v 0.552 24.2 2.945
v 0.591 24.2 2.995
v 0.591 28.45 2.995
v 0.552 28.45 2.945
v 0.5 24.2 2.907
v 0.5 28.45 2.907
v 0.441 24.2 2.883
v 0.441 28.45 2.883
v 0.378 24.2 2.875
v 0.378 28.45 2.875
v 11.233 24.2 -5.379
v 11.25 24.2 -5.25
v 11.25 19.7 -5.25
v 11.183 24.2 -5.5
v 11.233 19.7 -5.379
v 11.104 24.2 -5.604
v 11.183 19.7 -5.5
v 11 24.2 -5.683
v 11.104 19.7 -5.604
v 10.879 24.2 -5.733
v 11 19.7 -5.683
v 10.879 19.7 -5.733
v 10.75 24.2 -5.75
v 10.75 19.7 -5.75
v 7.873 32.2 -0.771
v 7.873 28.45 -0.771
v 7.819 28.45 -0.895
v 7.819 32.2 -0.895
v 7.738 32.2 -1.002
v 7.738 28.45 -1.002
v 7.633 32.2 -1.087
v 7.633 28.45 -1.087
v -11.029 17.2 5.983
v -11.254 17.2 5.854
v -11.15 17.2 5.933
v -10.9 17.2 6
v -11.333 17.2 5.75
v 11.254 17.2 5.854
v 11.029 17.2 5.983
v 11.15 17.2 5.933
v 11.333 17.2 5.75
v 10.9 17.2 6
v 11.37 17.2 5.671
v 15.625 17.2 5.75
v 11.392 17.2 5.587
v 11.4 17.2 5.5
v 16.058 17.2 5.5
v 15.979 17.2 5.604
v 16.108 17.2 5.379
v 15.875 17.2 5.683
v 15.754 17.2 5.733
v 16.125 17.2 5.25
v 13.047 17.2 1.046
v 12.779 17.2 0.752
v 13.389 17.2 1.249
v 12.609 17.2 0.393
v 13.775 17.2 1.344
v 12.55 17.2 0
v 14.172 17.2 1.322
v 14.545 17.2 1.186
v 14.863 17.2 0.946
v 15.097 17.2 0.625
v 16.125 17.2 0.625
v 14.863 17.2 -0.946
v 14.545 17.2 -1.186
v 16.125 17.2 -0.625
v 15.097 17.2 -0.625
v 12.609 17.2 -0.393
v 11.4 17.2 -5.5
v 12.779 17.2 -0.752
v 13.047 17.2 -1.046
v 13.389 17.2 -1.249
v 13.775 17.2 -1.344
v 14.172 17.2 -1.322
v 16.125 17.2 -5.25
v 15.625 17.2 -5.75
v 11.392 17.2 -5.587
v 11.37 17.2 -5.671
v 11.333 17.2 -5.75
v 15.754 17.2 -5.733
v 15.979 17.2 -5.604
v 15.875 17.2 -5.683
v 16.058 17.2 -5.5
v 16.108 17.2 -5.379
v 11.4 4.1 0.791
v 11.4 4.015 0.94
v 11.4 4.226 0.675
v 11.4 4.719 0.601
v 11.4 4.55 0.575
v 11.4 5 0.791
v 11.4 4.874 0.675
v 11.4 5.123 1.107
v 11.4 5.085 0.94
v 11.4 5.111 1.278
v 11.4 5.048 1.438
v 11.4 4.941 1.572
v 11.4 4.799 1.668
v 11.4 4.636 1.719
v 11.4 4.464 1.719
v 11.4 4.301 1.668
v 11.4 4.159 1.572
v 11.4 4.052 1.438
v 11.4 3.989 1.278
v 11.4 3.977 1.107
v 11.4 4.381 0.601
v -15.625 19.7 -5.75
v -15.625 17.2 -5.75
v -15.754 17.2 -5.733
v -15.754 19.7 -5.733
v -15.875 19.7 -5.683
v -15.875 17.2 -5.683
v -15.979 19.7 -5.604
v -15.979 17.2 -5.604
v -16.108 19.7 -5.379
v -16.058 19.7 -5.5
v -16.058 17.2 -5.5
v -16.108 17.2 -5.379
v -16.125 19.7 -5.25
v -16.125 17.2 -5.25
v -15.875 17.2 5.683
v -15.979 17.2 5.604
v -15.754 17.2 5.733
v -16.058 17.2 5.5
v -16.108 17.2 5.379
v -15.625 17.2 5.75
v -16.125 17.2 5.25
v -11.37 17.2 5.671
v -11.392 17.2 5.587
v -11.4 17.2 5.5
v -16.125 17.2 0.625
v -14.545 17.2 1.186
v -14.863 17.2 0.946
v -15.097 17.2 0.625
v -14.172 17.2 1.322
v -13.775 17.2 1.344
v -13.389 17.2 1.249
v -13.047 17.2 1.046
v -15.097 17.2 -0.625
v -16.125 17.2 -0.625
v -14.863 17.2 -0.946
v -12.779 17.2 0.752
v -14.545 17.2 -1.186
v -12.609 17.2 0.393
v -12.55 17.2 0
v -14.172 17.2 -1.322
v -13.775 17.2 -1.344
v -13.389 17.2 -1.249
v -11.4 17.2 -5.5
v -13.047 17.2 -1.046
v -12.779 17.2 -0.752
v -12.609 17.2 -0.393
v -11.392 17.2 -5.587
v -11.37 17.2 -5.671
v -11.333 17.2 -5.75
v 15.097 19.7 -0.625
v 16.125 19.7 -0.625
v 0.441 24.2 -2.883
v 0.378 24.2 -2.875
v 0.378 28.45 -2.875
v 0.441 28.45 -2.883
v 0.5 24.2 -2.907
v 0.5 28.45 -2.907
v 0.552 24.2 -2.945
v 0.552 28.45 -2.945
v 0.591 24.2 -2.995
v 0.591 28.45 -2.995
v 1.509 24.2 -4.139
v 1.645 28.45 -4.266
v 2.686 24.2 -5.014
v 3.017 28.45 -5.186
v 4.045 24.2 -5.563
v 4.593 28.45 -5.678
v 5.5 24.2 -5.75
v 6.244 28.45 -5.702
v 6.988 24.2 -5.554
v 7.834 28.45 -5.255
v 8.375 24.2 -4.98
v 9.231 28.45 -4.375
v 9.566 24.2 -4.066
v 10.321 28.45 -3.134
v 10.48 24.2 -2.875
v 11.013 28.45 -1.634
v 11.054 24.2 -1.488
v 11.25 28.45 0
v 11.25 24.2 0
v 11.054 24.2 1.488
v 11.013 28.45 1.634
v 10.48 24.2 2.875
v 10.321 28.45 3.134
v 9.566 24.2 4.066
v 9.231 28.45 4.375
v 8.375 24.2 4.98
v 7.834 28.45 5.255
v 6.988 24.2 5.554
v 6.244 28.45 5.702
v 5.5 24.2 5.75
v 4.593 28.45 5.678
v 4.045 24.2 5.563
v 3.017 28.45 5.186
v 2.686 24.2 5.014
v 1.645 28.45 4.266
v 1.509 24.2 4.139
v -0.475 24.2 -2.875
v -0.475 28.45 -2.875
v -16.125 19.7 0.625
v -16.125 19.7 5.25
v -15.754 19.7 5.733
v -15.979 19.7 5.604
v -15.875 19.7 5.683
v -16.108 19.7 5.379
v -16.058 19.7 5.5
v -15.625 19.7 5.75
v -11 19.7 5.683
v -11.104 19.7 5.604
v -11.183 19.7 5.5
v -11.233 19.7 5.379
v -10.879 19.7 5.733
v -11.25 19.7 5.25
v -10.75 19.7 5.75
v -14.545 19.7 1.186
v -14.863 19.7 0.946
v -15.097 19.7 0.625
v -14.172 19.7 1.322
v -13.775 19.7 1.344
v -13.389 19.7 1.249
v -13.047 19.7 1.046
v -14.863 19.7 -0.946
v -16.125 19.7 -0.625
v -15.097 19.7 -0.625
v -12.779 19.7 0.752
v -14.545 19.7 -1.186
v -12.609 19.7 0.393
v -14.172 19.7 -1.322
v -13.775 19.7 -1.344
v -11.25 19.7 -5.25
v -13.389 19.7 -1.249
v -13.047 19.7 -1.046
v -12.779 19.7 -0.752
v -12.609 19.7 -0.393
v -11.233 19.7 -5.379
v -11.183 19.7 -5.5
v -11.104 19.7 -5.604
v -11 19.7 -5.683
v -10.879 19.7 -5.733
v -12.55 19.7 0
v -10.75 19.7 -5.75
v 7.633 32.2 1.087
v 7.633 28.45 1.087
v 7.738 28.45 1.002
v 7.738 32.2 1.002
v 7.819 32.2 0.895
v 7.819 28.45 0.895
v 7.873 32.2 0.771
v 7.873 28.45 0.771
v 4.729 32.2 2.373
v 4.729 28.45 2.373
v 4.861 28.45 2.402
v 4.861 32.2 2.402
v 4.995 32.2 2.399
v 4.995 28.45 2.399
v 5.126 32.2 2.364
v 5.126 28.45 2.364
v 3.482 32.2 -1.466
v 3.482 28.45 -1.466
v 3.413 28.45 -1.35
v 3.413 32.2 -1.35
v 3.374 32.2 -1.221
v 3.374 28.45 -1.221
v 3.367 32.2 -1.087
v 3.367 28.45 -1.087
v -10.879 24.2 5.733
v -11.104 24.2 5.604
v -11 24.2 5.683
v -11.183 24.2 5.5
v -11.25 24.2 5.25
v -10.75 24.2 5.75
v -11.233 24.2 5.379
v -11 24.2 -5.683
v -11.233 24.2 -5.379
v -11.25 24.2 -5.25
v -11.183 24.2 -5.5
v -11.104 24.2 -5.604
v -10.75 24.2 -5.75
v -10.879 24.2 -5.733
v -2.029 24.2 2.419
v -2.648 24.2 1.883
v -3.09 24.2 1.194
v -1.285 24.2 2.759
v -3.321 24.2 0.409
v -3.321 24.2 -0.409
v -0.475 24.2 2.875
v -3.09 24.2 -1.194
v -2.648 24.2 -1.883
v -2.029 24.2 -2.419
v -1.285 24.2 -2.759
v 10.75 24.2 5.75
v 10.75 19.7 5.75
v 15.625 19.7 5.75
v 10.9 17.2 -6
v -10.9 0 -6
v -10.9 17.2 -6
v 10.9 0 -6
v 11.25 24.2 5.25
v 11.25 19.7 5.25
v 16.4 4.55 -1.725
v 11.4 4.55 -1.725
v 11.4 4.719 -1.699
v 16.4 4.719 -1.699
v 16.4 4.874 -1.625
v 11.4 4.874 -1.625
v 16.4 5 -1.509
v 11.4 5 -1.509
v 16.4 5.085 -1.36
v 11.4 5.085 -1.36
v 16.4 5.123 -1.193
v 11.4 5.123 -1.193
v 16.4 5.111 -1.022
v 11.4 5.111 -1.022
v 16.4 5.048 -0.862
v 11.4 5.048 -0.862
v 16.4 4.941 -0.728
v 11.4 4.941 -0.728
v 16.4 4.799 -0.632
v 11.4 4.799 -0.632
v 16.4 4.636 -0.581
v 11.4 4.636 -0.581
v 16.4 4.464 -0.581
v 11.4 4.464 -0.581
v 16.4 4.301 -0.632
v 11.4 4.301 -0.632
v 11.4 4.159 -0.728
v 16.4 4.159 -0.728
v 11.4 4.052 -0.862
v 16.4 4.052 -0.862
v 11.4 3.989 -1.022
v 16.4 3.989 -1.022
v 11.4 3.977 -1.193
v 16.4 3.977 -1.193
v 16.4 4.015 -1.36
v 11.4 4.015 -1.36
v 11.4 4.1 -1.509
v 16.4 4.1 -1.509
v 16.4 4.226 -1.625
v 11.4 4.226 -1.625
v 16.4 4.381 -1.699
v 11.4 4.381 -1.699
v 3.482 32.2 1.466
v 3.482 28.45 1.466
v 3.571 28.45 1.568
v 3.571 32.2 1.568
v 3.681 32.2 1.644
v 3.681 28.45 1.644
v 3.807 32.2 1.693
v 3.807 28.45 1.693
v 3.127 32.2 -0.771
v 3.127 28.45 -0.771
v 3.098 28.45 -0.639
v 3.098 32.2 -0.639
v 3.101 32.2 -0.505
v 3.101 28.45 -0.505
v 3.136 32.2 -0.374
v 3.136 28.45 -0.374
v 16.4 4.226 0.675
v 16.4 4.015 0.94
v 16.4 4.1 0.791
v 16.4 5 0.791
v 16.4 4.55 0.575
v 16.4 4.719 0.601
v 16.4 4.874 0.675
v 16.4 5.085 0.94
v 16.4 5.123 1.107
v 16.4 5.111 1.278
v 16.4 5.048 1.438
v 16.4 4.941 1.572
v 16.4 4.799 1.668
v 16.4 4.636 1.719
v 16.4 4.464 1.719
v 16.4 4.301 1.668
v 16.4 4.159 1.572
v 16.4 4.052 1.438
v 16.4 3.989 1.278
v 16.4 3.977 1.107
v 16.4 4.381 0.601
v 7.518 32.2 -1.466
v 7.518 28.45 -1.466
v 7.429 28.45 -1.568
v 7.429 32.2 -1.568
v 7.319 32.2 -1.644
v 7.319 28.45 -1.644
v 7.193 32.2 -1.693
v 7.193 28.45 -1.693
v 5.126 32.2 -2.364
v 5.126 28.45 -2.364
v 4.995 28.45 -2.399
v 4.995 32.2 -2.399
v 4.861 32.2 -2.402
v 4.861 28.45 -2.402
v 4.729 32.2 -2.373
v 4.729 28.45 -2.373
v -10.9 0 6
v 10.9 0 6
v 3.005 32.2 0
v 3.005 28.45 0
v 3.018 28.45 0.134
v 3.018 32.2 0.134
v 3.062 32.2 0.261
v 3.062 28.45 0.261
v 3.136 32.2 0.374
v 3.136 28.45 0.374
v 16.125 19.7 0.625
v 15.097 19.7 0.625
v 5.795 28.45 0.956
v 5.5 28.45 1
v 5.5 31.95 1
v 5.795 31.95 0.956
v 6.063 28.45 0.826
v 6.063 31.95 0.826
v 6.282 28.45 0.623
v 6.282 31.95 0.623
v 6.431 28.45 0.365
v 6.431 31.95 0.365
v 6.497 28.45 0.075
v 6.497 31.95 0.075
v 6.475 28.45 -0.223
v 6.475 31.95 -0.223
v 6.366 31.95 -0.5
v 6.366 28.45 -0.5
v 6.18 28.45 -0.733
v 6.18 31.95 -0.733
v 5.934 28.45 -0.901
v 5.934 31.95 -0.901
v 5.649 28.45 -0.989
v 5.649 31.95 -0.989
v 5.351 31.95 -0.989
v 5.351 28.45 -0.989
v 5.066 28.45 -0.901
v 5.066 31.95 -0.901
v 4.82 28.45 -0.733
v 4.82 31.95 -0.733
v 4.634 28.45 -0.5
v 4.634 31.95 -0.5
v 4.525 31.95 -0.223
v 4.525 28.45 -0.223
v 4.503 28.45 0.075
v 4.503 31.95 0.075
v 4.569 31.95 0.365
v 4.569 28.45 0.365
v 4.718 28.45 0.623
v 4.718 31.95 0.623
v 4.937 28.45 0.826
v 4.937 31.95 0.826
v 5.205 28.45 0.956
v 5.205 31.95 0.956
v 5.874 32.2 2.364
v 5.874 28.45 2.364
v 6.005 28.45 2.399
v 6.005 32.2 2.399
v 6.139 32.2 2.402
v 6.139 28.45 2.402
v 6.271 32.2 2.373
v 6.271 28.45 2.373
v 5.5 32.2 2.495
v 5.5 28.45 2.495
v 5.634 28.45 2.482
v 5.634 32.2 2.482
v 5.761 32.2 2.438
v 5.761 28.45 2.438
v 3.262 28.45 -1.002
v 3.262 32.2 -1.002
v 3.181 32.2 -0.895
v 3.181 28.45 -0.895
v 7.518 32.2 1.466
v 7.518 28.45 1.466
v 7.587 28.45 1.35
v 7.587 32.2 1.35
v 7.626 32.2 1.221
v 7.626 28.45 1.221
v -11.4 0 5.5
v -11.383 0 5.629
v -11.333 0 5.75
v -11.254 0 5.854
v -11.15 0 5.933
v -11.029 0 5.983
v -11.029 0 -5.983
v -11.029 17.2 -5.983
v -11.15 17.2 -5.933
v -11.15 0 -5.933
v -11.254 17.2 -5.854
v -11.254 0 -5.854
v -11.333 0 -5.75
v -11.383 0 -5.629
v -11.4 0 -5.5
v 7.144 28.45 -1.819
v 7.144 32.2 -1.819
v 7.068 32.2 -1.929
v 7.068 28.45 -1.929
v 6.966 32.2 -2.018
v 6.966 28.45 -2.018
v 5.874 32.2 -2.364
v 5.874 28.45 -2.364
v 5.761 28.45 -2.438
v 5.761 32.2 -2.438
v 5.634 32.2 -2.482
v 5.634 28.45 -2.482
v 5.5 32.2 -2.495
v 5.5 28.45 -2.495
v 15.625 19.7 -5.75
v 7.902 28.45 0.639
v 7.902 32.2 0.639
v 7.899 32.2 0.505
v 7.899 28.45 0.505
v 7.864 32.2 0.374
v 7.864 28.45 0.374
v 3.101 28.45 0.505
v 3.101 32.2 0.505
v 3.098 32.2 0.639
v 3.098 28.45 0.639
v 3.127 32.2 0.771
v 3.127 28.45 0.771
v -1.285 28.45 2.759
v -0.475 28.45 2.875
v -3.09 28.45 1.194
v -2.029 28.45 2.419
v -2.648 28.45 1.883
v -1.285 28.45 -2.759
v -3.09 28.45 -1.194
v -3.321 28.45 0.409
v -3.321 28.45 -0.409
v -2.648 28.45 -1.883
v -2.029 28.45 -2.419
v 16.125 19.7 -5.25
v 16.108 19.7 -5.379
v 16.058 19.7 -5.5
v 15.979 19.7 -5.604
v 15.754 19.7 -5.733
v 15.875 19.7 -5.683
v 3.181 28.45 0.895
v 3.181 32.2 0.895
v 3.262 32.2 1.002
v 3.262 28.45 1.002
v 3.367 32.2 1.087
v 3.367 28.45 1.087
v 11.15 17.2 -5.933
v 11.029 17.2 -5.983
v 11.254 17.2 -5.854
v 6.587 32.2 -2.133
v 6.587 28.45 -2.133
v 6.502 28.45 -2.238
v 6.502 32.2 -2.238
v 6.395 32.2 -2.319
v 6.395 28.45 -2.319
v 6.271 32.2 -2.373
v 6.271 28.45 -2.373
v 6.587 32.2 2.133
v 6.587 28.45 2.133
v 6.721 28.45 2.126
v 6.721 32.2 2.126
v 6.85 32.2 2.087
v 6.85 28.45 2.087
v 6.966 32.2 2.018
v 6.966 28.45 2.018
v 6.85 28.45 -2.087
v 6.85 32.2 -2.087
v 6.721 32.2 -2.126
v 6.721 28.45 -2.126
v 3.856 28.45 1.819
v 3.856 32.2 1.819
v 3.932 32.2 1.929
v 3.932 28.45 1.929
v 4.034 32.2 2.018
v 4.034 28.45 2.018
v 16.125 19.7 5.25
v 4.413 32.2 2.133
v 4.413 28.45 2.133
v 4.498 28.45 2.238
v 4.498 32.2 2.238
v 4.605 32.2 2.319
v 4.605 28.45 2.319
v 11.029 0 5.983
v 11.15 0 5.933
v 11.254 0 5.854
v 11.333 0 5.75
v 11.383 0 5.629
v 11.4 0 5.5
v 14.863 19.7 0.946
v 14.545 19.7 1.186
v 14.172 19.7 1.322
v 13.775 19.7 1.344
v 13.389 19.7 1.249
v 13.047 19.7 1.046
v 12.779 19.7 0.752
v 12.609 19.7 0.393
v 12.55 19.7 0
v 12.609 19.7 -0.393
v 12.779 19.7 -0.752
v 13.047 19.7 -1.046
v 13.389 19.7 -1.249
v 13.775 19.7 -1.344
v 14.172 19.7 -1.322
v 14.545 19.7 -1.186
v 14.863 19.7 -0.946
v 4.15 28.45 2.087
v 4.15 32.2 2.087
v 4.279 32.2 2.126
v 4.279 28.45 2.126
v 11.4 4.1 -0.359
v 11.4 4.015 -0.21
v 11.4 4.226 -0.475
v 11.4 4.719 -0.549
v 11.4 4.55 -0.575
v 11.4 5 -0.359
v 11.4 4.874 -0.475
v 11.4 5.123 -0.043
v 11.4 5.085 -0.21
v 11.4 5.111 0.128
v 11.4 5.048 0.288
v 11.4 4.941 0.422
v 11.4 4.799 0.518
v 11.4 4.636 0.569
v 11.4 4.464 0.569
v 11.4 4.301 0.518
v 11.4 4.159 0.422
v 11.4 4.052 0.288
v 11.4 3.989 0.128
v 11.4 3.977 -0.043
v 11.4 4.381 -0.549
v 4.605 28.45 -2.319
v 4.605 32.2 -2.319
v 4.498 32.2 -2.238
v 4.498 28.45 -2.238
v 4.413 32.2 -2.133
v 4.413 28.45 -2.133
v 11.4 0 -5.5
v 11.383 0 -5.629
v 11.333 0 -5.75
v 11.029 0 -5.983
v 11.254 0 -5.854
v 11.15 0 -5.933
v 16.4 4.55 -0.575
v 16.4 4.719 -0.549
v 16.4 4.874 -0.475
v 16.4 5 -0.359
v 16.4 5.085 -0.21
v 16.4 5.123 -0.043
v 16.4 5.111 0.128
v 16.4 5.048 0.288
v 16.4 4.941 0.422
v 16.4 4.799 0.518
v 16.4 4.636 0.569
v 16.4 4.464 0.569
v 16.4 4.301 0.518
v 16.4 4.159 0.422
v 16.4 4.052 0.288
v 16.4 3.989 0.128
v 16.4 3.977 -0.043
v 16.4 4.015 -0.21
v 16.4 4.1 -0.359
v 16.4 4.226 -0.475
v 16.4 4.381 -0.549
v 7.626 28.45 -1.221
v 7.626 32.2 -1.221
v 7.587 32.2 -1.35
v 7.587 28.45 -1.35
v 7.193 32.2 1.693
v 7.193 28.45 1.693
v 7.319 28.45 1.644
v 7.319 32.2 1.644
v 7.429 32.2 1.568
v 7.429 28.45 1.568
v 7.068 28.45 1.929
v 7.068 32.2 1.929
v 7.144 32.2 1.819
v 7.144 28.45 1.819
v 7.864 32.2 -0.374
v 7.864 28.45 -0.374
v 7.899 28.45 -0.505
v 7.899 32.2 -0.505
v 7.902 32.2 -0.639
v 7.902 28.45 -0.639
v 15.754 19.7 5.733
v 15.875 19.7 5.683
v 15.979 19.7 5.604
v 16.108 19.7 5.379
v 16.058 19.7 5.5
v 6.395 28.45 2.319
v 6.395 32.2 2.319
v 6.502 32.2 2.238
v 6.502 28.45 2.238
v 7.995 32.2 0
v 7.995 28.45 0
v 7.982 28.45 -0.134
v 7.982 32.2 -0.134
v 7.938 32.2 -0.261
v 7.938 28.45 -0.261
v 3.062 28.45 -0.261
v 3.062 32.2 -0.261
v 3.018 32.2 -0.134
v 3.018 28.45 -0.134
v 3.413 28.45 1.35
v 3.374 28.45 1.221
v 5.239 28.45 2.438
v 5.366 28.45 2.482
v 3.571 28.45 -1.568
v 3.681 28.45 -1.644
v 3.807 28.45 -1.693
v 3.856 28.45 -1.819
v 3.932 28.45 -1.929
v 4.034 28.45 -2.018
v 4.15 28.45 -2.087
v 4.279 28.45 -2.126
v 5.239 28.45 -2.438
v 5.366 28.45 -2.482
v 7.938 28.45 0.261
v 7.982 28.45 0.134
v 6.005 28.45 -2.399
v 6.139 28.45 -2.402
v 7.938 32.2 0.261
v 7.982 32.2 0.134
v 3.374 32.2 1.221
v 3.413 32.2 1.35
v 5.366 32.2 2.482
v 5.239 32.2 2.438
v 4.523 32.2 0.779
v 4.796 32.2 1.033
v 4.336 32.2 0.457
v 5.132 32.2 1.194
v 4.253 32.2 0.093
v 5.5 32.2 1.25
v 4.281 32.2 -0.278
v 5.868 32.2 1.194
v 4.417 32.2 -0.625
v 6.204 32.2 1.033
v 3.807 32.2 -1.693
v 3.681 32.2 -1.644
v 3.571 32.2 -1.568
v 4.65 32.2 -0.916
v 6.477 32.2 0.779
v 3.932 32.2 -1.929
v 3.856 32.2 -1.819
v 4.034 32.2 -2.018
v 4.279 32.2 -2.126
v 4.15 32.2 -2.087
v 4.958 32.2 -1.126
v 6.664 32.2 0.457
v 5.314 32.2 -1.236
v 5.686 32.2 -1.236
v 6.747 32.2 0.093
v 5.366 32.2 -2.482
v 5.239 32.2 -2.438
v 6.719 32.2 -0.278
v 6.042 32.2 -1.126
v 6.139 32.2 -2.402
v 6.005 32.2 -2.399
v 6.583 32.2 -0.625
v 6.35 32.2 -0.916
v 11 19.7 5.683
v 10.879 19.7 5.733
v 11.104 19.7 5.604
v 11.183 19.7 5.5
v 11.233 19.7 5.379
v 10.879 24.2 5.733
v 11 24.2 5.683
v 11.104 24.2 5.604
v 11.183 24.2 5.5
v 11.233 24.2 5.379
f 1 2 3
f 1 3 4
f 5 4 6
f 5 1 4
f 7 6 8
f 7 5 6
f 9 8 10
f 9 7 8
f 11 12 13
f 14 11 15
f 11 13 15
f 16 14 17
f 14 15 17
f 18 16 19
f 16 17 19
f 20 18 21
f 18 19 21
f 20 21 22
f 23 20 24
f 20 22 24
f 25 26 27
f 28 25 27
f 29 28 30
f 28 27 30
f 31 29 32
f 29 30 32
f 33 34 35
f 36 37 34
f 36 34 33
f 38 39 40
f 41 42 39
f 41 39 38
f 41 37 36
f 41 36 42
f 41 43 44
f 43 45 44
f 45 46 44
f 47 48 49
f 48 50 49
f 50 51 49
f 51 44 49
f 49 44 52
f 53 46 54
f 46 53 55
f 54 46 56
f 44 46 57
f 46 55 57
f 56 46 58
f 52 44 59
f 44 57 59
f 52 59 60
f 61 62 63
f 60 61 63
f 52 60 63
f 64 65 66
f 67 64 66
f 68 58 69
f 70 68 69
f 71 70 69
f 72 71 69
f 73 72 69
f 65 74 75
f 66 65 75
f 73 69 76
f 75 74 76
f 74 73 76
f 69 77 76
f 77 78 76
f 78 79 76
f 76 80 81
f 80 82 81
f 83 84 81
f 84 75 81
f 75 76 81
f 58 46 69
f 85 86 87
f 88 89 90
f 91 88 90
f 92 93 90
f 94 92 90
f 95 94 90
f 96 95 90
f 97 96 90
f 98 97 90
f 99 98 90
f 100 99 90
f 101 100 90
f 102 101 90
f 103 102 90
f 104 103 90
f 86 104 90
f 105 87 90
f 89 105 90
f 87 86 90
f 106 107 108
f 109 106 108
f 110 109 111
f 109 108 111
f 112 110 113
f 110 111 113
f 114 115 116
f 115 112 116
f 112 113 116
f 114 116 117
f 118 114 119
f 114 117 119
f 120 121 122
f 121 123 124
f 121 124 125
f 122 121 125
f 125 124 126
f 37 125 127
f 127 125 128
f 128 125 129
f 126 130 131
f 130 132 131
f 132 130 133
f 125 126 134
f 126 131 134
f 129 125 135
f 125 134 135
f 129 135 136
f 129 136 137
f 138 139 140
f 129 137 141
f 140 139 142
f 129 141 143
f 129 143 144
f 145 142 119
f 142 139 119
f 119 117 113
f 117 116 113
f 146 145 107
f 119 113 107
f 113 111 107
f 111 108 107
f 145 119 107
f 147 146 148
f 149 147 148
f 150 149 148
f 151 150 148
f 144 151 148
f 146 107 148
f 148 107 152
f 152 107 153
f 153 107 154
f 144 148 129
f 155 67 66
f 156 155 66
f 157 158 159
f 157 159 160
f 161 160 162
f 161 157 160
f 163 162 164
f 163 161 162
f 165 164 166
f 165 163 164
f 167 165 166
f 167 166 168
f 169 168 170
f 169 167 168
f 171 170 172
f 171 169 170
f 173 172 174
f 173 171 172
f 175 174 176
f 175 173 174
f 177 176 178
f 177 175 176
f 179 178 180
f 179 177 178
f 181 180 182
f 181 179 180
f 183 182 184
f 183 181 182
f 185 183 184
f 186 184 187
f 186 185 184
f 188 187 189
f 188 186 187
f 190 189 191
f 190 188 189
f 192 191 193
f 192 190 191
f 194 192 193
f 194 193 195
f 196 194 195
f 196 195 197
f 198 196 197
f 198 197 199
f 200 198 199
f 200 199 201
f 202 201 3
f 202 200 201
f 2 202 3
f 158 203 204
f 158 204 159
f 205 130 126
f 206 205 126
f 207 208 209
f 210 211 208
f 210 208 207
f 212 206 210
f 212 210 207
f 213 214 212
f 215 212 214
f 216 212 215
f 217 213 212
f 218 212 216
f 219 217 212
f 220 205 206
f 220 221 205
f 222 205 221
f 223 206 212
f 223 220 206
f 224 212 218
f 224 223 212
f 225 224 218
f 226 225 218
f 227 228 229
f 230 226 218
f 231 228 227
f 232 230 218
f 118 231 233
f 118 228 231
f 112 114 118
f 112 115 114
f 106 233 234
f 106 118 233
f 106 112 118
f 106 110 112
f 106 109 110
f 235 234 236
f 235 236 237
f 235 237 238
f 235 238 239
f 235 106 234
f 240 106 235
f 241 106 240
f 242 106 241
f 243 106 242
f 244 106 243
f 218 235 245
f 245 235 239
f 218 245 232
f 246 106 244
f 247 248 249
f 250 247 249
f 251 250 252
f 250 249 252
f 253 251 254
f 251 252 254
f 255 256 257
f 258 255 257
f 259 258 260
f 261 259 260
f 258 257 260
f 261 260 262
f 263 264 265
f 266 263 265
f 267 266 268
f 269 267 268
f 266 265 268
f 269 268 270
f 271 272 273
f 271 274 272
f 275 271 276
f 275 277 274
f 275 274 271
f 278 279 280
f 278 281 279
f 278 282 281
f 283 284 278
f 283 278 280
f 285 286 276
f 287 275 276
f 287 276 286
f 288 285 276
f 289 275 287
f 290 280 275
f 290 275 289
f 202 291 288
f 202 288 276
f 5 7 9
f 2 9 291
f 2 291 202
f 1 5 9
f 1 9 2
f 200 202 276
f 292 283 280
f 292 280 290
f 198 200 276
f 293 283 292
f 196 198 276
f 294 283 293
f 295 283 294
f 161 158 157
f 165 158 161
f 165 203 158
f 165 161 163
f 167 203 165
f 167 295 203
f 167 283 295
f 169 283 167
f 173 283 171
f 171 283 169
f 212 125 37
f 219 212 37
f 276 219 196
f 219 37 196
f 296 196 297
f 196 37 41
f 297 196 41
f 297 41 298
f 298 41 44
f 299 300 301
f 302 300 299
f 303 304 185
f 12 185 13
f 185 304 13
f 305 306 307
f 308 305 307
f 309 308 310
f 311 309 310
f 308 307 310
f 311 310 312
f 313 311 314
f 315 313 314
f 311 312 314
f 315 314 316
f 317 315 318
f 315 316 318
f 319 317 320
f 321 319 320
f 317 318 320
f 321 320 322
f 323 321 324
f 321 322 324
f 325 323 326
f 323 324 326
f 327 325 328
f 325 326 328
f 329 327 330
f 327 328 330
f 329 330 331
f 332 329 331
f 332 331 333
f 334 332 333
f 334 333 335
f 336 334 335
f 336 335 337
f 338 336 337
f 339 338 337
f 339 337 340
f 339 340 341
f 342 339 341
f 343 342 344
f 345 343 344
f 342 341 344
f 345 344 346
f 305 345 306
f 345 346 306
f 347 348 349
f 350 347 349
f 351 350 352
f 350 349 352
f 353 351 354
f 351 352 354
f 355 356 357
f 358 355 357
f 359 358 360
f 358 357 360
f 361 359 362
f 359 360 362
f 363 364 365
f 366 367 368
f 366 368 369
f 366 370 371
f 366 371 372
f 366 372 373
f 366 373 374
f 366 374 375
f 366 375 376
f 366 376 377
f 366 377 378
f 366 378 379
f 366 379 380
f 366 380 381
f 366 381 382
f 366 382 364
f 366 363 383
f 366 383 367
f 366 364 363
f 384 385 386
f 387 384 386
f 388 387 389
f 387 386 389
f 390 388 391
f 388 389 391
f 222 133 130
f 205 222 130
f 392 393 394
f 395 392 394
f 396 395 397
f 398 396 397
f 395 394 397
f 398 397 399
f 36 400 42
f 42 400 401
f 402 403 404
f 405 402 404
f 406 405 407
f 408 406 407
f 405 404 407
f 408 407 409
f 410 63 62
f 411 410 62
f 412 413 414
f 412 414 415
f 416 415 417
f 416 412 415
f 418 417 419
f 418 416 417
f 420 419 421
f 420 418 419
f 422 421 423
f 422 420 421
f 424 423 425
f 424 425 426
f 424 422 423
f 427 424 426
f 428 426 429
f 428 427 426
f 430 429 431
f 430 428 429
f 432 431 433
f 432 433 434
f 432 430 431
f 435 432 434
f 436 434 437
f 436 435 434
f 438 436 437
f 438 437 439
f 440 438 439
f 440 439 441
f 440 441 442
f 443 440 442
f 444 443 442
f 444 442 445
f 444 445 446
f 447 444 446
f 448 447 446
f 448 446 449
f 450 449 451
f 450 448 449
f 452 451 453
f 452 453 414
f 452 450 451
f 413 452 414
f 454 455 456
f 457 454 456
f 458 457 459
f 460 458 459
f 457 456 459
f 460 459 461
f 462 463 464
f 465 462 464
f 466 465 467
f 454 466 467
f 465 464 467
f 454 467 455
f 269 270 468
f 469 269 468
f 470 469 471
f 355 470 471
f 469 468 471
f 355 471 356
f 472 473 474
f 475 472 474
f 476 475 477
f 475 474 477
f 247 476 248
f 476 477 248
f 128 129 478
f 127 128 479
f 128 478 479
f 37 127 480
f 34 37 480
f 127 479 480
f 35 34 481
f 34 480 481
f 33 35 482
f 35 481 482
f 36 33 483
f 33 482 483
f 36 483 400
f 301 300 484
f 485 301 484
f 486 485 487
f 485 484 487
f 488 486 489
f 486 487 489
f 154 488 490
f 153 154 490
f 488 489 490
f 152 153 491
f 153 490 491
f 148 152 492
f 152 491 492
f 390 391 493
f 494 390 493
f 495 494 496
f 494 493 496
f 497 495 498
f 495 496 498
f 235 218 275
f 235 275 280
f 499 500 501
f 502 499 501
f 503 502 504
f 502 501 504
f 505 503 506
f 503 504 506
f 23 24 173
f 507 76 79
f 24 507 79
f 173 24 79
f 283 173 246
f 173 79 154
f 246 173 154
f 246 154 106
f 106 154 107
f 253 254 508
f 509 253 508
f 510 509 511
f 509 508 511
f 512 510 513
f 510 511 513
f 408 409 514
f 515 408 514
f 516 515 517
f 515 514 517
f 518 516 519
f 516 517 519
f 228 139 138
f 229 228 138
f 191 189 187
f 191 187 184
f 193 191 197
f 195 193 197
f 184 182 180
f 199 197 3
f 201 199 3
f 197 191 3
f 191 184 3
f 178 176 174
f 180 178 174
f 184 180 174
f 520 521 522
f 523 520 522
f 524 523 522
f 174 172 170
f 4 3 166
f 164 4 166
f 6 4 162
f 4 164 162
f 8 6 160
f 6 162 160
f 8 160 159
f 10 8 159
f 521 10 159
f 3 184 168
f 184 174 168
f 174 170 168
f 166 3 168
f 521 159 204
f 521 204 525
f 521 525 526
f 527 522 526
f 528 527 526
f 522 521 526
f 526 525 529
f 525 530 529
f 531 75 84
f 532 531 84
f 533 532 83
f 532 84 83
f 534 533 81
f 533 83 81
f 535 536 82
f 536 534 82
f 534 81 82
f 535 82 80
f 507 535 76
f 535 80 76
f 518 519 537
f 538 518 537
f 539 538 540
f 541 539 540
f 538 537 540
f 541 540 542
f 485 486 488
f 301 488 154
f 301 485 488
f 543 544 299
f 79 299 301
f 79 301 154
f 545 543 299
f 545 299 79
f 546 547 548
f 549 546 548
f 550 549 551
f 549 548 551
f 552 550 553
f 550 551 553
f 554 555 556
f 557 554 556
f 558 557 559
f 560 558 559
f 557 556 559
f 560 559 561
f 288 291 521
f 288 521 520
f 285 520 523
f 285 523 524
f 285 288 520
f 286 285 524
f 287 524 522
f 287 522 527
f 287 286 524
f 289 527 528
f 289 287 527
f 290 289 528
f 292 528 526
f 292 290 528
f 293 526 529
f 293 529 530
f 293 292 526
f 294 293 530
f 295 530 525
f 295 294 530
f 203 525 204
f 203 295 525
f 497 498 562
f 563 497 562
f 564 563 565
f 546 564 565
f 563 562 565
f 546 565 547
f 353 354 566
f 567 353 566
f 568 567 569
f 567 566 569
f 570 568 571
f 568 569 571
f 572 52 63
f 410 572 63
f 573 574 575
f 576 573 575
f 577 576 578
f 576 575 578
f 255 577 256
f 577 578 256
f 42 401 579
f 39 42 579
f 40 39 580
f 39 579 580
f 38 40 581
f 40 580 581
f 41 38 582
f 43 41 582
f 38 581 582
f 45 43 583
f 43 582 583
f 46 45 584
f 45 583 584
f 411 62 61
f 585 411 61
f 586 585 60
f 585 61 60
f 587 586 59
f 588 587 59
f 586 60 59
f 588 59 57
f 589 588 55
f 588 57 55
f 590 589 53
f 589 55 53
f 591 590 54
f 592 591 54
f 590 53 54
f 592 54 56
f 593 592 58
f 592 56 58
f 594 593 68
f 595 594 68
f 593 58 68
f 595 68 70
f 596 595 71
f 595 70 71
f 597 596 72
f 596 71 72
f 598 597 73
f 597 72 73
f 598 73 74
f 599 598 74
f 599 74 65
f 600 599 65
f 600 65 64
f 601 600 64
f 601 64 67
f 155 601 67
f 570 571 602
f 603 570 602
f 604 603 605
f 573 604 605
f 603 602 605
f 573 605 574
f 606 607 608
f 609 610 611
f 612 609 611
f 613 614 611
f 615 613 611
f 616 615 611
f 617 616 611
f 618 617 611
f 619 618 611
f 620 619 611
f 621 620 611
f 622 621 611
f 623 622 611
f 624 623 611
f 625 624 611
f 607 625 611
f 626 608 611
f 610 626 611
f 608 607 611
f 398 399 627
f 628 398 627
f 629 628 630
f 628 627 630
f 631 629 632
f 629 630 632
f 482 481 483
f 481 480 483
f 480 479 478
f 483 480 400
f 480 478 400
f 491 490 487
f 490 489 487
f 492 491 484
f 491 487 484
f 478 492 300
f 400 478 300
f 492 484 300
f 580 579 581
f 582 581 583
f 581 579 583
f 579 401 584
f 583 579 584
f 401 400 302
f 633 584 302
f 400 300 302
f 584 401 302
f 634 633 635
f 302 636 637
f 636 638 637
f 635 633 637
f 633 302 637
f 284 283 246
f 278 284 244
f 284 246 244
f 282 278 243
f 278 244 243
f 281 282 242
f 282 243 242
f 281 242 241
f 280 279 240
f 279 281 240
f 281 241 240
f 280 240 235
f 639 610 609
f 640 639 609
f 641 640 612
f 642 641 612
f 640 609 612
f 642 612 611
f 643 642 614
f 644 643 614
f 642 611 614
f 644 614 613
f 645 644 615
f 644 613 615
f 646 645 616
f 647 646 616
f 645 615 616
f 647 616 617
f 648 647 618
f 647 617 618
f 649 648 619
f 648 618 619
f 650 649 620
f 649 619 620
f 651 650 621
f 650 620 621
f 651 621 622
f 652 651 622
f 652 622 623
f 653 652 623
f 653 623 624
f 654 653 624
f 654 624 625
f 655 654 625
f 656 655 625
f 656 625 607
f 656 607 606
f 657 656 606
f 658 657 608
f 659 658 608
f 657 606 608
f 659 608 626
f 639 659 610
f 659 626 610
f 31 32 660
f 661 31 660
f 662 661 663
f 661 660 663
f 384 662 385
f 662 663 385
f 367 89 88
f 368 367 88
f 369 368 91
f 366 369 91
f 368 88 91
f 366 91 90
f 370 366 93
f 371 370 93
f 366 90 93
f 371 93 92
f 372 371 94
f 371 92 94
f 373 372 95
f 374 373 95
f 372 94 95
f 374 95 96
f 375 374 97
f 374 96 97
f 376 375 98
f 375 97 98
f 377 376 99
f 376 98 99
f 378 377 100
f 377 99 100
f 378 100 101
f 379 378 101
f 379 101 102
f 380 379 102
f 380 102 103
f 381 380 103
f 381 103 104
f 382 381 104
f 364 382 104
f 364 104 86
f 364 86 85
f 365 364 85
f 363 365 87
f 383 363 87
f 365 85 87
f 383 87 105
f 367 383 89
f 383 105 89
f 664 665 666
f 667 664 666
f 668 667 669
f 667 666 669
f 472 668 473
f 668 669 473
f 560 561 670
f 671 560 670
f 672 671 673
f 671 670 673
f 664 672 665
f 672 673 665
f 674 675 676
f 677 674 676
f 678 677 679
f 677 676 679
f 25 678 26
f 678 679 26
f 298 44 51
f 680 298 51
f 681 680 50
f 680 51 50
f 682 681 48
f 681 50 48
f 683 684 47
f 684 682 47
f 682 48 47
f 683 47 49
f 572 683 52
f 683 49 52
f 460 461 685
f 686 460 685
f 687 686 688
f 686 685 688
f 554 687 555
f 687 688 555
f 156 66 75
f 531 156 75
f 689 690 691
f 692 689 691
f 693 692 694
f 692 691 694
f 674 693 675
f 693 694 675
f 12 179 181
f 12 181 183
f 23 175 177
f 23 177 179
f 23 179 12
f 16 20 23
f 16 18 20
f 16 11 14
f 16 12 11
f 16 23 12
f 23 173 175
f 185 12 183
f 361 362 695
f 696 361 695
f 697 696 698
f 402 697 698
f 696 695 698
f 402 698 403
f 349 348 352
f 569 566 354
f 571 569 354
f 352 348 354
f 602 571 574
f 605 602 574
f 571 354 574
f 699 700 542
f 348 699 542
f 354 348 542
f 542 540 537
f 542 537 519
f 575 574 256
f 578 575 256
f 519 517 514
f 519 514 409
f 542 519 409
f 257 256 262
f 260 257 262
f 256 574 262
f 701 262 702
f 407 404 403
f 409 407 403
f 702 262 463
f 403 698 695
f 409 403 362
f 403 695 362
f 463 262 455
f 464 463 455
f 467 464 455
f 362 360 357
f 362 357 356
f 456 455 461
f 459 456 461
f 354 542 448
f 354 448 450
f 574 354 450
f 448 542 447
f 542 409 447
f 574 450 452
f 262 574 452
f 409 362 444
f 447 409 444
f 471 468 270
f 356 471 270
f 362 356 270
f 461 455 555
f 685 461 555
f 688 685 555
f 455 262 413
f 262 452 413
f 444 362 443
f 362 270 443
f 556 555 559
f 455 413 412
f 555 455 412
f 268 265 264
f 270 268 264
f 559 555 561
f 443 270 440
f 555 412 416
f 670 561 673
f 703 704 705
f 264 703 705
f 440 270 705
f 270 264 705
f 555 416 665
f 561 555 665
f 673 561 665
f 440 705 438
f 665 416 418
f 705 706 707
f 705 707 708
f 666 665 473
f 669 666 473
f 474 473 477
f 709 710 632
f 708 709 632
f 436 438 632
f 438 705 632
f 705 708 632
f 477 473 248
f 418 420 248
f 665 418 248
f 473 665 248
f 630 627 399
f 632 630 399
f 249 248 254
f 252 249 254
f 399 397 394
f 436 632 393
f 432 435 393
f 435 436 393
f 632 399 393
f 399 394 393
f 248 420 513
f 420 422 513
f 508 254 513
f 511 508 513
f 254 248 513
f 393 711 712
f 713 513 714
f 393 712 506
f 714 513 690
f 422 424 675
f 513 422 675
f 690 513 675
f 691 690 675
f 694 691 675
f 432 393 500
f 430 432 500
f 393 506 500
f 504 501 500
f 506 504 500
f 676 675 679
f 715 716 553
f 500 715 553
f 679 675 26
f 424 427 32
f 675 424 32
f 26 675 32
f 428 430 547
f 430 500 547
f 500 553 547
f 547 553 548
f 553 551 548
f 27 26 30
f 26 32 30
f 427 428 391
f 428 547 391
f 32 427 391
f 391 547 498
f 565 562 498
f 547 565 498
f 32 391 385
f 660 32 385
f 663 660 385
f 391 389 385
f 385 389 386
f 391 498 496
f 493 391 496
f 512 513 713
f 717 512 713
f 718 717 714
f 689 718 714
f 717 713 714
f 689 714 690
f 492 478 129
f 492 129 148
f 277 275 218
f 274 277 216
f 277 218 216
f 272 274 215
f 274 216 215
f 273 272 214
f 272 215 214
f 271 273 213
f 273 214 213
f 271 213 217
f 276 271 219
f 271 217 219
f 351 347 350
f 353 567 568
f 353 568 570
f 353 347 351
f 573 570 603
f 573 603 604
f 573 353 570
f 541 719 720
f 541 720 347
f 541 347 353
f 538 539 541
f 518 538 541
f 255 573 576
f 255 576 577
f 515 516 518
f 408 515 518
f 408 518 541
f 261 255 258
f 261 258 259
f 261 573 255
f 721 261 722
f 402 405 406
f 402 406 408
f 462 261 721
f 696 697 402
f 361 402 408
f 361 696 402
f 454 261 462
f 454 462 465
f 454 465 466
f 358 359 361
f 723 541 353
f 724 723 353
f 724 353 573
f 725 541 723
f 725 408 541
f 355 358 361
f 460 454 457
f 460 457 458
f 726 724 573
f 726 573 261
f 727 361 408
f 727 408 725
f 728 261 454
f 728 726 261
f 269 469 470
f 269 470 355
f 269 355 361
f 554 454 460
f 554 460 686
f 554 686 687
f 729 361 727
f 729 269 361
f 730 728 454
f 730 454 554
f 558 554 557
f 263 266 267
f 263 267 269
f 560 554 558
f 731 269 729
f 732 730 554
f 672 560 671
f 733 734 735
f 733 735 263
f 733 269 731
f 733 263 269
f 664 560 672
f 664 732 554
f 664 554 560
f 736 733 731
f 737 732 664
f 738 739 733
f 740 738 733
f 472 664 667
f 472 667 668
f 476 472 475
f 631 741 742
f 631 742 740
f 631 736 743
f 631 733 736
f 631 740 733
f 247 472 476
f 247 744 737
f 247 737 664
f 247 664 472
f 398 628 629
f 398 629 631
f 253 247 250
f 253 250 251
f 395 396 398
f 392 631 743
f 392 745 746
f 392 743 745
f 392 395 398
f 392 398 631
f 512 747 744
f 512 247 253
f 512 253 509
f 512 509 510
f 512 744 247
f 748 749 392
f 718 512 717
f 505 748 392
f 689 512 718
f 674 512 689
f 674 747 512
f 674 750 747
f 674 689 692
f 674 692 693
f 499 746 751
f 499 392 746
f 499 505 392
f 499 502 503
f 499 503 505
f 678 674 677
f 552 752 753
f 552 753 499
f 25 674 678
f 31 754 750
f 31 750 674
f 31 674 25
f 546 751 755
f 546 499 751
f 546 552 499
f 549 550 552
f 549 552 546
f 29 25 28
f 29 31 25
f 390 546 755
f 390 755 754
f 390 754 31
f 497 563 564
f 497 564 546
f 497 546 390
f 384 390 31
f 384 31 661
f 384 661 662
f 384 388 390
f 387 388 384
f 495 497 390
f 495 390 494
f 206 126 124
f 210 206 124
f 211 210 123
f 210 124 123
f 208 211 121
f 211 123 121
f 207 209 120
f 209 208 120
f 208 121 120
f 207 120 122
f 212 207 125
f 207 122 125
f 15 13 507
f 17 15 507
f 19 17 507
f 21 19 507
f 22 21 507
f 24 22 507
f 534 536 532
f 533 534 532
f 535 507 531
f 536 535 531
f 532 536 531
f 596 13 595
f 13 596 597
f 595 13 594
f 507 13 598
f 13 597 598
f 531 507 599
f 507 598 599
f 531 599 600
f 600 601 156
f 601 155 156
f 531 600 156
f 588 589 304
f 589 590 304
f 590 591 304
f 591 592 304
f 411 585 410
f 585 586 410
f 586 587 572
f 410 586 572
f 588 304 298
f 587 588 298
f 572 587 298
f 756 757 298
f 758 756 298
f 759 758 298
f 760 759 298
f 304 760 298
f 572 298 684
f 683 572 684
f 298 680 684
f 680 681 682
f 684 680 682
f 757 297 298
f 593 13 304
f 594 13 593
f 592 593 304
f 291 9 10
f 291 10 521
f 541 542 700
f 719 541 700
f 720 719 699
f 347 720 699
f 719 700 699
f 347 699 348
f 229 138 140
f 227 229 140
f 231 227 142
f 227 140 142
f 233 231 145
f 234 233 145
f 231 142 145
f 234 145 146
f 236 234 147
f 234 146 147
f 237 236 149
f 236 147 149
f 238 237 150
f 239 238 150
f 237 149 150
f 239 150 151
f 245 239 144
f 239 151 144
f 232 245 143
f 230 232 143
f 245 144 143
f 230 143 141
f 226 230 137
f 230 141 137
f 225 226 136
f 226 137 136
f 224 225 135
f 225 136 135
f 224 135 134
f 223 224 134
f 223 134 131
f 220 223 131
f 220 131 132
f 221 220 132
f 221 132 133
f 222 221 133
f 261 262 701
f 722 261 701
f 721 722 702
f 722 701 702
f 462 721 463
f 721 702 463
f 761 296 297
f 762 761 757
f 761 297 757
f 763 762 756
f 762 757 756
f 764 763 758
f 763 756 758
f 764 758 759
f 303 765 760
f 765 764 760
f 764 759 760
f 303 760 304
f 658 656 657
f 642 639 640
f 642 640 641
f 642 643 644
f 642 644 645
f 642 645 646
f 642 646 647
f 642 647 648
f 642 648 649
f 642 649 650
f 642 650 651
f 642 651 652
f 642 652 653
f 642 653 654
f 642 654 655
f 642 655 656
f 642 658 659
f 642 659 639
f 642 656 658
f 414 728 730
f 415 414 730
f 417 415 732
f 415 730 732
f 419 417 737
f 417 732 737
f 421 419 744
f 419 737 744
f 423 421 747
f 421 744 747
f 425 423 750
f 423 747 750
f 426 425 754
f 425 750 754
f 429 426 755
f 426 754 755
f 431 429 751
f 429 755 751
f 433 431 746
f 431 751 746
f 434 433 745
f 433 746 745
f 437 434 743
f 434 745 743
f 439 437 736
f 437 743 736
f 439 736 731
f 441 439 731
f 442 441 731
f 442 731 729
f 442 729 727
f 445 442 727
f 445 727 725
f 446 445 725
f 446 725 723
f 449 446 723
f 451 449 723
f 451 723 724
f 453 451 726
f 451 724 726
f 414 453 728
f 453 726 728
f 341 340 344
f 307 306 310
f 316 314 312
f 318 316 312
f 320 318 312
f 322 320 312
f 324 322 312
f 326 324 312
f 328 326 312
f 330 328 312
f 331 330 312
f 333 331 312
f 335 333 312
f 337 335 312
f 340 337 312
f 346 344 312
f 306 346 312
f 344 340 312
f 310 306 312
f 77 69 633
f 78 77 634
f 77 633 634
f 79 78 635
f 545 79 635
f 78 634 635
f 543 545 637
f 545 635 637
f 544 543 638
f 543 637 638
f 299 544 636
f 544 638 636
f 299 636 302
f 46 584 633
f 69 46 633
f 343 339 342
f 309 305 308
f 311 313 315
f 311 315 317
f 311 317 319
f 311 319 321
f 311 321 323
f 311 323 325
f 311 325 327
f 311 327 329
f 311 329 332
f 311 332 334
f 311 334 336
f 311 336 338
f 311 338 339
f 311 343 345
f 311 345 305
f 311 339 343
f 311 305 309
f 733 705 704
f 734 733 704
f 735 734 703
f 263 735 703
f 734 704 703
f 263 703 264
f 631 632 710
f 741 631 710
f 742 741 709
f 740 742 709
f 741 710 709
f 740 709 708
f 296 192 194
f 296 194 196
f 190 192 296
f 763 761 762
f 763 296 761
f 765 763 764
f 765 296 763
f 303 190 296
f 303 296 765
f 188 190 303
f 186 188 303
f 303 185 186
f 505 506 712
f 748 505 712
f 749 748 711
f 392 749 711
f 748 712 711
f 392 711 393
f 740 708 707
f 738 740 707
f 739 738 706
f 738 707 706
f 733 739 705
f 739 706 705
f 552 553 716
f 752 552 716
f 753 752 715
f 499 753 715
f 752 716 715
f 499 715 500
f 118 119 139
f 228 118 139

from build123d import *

# Parameters (mm, degrees)
SKETCH1_W           = 22.8
SKETCH1_H           = 12
BOSS_EXTRUDE1_DEPTH = 17.2
BOSS_EXTRUDE2_DEPTH = 2.5
SKETCH3_W           = 22.5
SKETCH3_H           = 11.5
BOSS_EXTRUDE3_DEPTH = 4.5
BOSS_EXTRUDE4_DEPTH = 4.25
SKETCH5_R           = 1
BOSS_EXTRUDE5_DEPTH = 3.75
CHAMFER1_SIZE       = 0.25
FILLET1_R           = 0.5
SKETCH7_R           = 0.575
BOSS_EXTRUDE6_DEPTH = 5
SKETCH7_3_R         = 0.575
BOSS_EXTRUDE7_DEPTH = 5
SKETCH7_4_R         = 0.575
BOSS_EXTRUDE8_DEPTH = 5


with BuildPart() as part:
    # Sketch1 → Boss-Extrude1 (new body)
    with BuildSketch(Plane(origin=(0, 0, 0), x_dir=(1, 0, 0), z_dir=(0, 1, 0))):
        Rectangle(SKETCH1_W, SKETCH1_H)
    extrude(amount=BOSS_EXTRUDE1_DEPTH)

    # Sketch2 → Boss-Extrude2 (add)
    with BuildSketch(Plane(origin=(0, 17.2, 0), x_dir=(1, 0, 0), z_dir=(0, 1, 0))):
        with BuildLine():
            Line((-16.125, -5.75), (16.125, -5.75))
            Line((16.125, -5.75), (16.125, -0.625))
            Line((16.125, -0.625), (15.096609794, -0.625))
            ThreePointArc((15.096609794, -0.625), (12.55, 0), (15.096609794, 0.625))
            Line((15.096609794, 0.625), (16.125, 0.625))
            Line((16.125, 0.625), (16.125, 5.75))
            Line((16.125, 5.75), (-16.125, 5.75))
            Line((-16.125, 5.75), (-16.125, 0.625))
            Line((-16.125, 0.625), (-15.096609794, 0.625))
            ThreePointArc((-15.096609794, 0.625), (-12.55, 0), (-15.096609794, -0.625))
            Line((-15.096609794, -0.625), (-16.125, -0.625))
            Line((-16.125, -0.625), (-16.125, -5.75))
        make_face()
    extrude(amount=BOSS_EXTRUDE2_DEPTH)

    # Sketch3 → Boss-Extrude3 (add)
    with BuildSketch(Plane(origin=(0, 19.7, 0), x_dir=(1, 0, 0), z_dir=(0, 1, 0))):
        Rectangle(SKETCH3_W, SKETCH3_H)
    extrude(amount=BOSS_EXTRUDE3_DEPTH)

    # Sketch4 → Boss-Extrude4 (add)
    with BuildSketch(Plane(origin=(0, 24.2, 0), x_dir=(1, 0, 0), z_dir=(0, 1, 0))):
        with BuildLine():
            Line((-0.475, 2.875), (0.378049688, 2.875))
            ThreePointArc((0.378049688, 2.875), (0.500417814, 2.906995317), (0.591464284, 2.994791667))
            ThreePointArc((0.591464284, 2.994791667), (11.25, 0), (0.591464284, -2.994791667))
            ThreePointArc((0.591464284, -2.994791667), (0.500417814, -2.906995317), (0.378049688, -2.875))
            Line((0.378049688, -2.875), (-0.475, -2.875))
            ThreePointArc((-0.475, -2.875), (-3.35, 0), (-0.475, 2.875))
        make_face()
    extrude(amount=BOSS_EXTRUDE4_DEPTH)

    # Fillet1
    # the kernel refuses this fillet: 0.5 mm, written as the material it takes off along each edge
    with BuildSketch(Plane(origin=(16.125, 15.95, -5.75), x_dir=(-1, 0, 0), z_dir=(0, 1, 0)), Plane(origin=(-16.125, 15.95, 5.75), x_dir=(1, 0, 0), z_dir=(0, 1, 0))) as fillet1_piece_1:
        with BuildLine():
            CenterArc((FILLET1_R, FILLET1_R), FILLET1_R, 180, 90)
            Line((0, FILLET1_R), (0, 0))
            Line((0, 0), (FILLET1_R, 0))
        make_face()
    extrude(amount=5, mode=Mode.SUBTRACT)
    with BuildSketch(Plane(origin=(-16.125, 15.95, -5.75), x_dir=(1, 0, 0), z_dir=(0, 1, 0)), Plane(origin=(16.125, 15.95, 5.75), x_dir=(-1, 0, 0), z_dir=(0, 1, 0))) as fillet1_piece_2:
        with BuildLine():
            CenterArc((FILLET1_R, -FILLET1_R), FILLET1_R, 90, 90)
            Line((0, -FILLET1_R), (0, 0))
            Line((0, 0), (FILLET1_R, 0))
        make_face()
    extrude(amount=5, mode=Mode.SUBTRACT)
    with BuildSketch(Plane(origin=(11.25, 19.7, 5.75), x_dir=(-1, 0, 0), z_dir=(0, 1, 0)), Plane(origin=(-11.25, 19.7, -5.75), x_dir=(1, 0, 0), z_dir=(0, 1, 0))) as fillet1_piece_3:
        with BuildLine():
            CenterArc((FILLET1_R, -FILLET1_R), FILLET1_R, 90, 90)
            Line((0, -FILLET1_R), (0, 0))
            Line((0, 0), (FILLET1_R, 0))
        make_face()
    extrude(amount=5.75, mode=Mode.SUBTRACT)
    with BuildSketch(Plane(origin=(11.25, 19.7, -5.75), x_dir=(-1, 0, 0), z_dir=(0, 1, 0)), Plane(origin=(-11.25, 19.7, 5.75), x_dir=(1, 0, 0), z_dir=(0, 1, 0))) as fillet1_piece_4:
        with BuildLine():
            CenterArc((FILLET1_R, FILLET1_R), FILLET1_R, 180, 90)
            Line((0, FILLET1_R), (0, 0))
            Line((0, 0), (FILLET1_R, 0))
        make_face()
    extrude(amount=5.75, mode=Mode.SUBTRACT)
    with BuildSketch(Plane(origin=(11.4, -1.25, 6), x_dir=(-1, 0, 0), z_dir=(0, 1, 0)), Plane(origin=(11.4, -1.25, -6), x_dir=(0, 0, 1), z_dir=(0, 1, 0))) as fillet1_piece_5:
        with BuildLine():
            CenterArc((FILLET1_R, -FILLET1_R), FILLET1_R, 90, 90)
            Line((0, -FILLET1_R), (0, 0))
            Line((0, 0), (FILLET1_R, 0))
        make_face()
    extrude(amount=18.45, mode=Mode.SUBTRACT)
    with BuildSketch(Plane(origin=(-11.4, -1.25, 6), x_dir=(1, 0, 0), z_dir=(0, 1, 0)), Plane(origin=(-11.4, -1.25, -6), x_dir=(0, 0, 1), z_dir=(0, 1, 0))) as fillet1_piece_6:
        with BuildLine():
            CenterArc((FILLET1_R, FILLET1_R), FILLET1_R, 180, 90)
            Line((0, FILLET1_R), (0, 0))
            Line((0, 0), (FILLET1_R, 0))
        make_face()
    extrude(amount=18.45, mode=Mode.SUBTRACT)


with BuildPart() as body_2:
    # Sketch5 → Boss-Extrude5 (new body)
    with BuildSketch(Plane(origin=(0, 28.45, 0), x_dir=(1, 0, 0), z_dir=(0, 1, 0))):
        with BuildLine():
            ThreePointArc((3.135664935, 0.374473886), (3.036207488, 0.199165651), (3.005259069, 0))
            ThreePointArc((3.005259069, 0), (3.036207488, -0.199165651), (3.135664935, -0.374473886))
            ThreePointArc((3.135664935, -0.374473886), (3.095248505, -0.571935967), (3.127360381, -0.770917344))
            ThreePointArc((3.127360381, -0.770917344), (3.218339647, -0.950771547), (3.367102524, -1.086765545))
            ThreePointArc((3.367102524, -1.086765545), (3.389683354, -1.287052507), (3.481712191, -1.466371927))
            ThreePointArc((3.481712191, -1.466371927), (3.623816619, -1.6093093), (3.807322979, -1.692677021))
            ThreePointArc((3.807322979, -1.692677021), (3.8906907, -1.876183381), (4.033628073, -2.018287809))
            ThreePointArc((4.033628073, -2.018287809), (4.212947493, -2.110316646), (4.413234455, -2.132897476))
            ThreePointArc((4.413234455, -2.132897476), (4.549228453, -2.281660353), (4.729082656, -2.372639619))
            ThreePointArc((4.729082656, -2.372639619), (4.928064033, -2.404751495), (5.125526114, -2.364335065))
            ThreePointArc((5.125526114, -2.364335065), (5.300834349, -2.463792512), (5.5, -2.494740931))
            ThreePointArc((5.5, -2.494740931), (5.699165651, -2.463792512), (5.874473886, -2.364335065))
            ThreePointArc((5.874473886, -2.364335065), (6.071935967, -2.404751495), (6.270917344, -2.372639619))
            ThreePointArc((6.270917344, -2.372639619), (6.450771547, -2.281660353), (6.586765545, -2.132897476))
            ThreePointArc((6.586765545, -2.132897476), (6.787052507, -2.110316646), (6.966371927, -2.018287809))
            ThreePointArc((6.966371927, -2.018287809), (7.1093093, -1.876183381), (7.192677021, -1.692677021))
            ThreePointArc((7.192677021, -1.692677021), (7.376183381, -1.6093093), (7.518287809, -1.466371927))
            ThreePointArc((7.518287809, -1.466371927), (7.610316646, -1.287052507), (7.632897476, -1.086765545))
            ThreePointArc((7.632897476, -1.086765545), (7.781660353, -0.950771547), (7.872639619, -0.770917344))
            ThreePointArc((7.872639619, -0.770917344), (7.904751495, -0.571935967), (7.864335065, -0.374473886))
            ThreePointArc((7.864335065, -0.374473886), (7.963792512, -0.199165651), (7.994740931, 0))
            ThreePointArc((7.994740931, 0), (7.963792512, 0.199165651), (7.864335065, 0.374473886))
            ThreePointArc((7.864335065, 0.374473886), (7.904751495, 0.571935967), (7.872639619, 0.770917344))
            ThreePointArc((7.872639619, 0.770917344), (7.781660353, 0.950771547), (7.632897476, 1.086765545))
            ThreePointArc((7.632897476, 1.086765545), (7.610316646, 1.287052507), (7.518287809, 1.466371927))
            ThreePointArc((7.518287809, 1.466371927), (7.376183381, 1.6093093), (7.192677021, 1.692677021))
            ThreePointArc((7.192677021, 1.692677021), (7.1093093, 1.876183381), (6.966371927, 2.018287809))
            ThreePointArc((6.966371927, 2.018287809), (6.787052507, 2.110316646), (6.586765545, 2.132897476))
            ThreePointArc((6.586765545, 2.132897476), (6.450771547, 2.281660353), (6.270917344, 2.372639619))
            ThreePointArc((6.270917344, 2.372639619), (6.071935967, 2.404751495), (5.874473886, 2.364335065))
            ThreePointArc((5.874473886, 2.364335065), (5.699165651, 2.463792512), (5.5, 2.494740931))
            ThreePointArc((5.5, 2.494740931), (5.300834349, 2.463792512), (5.125526114, 2.364335065))
            ThreePointArc((5.125526114, 2.364335065), (4.928064033, 2.404751495), (4.729082656, 2.372639619))
            ThreePointArc((4.729082656, 2.372639619), (4.549228453, 2.281660353), (4.413234455, 2.132897476))
            ThreePointArc((4.413234455, 2.132897476), (4.212947493, 2.110316646), (4.033628073, 2.018287809))
            ThreePointArc((4.033628073, 2.018287809), (3.8906907, 1.876183381), (3.807322979, 1.692677021))
            ThreePointArc((3.807322979, 1.692677021), (3.623816619, 1.6093093), (3.481712191, 1.466371927))
            ThreePointArc((3.481712191, 1.466371927), (3.389683354, 1.287052507), (3.367102524, 1.086765545))
            ThreePointArc((3.367102524, 1.086765545), (3.218339647, 0.950771547), (3.127360381, 0.770917344))
            ThreePointArc((3.127360381, 0.770917344), (3.095248505, 0.571935967), (3.135664935, 0.374473886))
        make_face()
        with Locations(Location((5.5, 0, 0), (0, 0, 270))):
            Circle(SKETCH5_R, mode=Mode.SUBTRACT)
    extrude(amount=BOSS_EXTRUDE5_DEPTH)

    # Chamfer1
    chamfer1_edges = [body_2.edges().sort_by_distance(p)[0] for p in [
        (5.5, 32.2, -1),
    ]]
    chamfer(chamfer1_edges, length=CHAMFER1_SIZE)


with BuildPart() as body_3:
    # Sketch7 → Boss-Extrude6 (new body)
    with BuildSketch(Plane(origin=(11.4, 0, 0), x_dir=(0, 0, -1), z_dir=(1, 0, 0))):
        with Locations((-1.15, 4.55)):
            Circle(SKETCH7_R)
    extrude(amount=BOSS_EXTRUDE6_DEPTH)


with BuildPart() as body_4:
    # Sketch7<3> → Boss-Extrude7 (new body)
    with BuildSketch(Plane(origin=(11.4, 0, 0), x_dir=(0, 0, -1), z_dir=(1, 0, 0))):
        with Locations((0, 4.55)):
            Circle(SKETCH7_3_R)
    extrude(amount=BOSS_EXTRUDE7_DEPTH)


with BuildPart() as body_5:
    # Sketch7<4> → Boss-Extrude8 (new body)
    with BuildSketch(Plane(origin=(11.4, 0, 0), x_dir=(0, 0, -1), z_dir=(1, 0, 0))):
        with Locations((1.15, 4.55)):
            Circle(SKETCH7_4_R)
    extrude(amount=BOSS_EXTRUDE8_DEPTH)


solid = Compound([part.part, body_2.part, body_3.part, body_4.part, body_5.part])
